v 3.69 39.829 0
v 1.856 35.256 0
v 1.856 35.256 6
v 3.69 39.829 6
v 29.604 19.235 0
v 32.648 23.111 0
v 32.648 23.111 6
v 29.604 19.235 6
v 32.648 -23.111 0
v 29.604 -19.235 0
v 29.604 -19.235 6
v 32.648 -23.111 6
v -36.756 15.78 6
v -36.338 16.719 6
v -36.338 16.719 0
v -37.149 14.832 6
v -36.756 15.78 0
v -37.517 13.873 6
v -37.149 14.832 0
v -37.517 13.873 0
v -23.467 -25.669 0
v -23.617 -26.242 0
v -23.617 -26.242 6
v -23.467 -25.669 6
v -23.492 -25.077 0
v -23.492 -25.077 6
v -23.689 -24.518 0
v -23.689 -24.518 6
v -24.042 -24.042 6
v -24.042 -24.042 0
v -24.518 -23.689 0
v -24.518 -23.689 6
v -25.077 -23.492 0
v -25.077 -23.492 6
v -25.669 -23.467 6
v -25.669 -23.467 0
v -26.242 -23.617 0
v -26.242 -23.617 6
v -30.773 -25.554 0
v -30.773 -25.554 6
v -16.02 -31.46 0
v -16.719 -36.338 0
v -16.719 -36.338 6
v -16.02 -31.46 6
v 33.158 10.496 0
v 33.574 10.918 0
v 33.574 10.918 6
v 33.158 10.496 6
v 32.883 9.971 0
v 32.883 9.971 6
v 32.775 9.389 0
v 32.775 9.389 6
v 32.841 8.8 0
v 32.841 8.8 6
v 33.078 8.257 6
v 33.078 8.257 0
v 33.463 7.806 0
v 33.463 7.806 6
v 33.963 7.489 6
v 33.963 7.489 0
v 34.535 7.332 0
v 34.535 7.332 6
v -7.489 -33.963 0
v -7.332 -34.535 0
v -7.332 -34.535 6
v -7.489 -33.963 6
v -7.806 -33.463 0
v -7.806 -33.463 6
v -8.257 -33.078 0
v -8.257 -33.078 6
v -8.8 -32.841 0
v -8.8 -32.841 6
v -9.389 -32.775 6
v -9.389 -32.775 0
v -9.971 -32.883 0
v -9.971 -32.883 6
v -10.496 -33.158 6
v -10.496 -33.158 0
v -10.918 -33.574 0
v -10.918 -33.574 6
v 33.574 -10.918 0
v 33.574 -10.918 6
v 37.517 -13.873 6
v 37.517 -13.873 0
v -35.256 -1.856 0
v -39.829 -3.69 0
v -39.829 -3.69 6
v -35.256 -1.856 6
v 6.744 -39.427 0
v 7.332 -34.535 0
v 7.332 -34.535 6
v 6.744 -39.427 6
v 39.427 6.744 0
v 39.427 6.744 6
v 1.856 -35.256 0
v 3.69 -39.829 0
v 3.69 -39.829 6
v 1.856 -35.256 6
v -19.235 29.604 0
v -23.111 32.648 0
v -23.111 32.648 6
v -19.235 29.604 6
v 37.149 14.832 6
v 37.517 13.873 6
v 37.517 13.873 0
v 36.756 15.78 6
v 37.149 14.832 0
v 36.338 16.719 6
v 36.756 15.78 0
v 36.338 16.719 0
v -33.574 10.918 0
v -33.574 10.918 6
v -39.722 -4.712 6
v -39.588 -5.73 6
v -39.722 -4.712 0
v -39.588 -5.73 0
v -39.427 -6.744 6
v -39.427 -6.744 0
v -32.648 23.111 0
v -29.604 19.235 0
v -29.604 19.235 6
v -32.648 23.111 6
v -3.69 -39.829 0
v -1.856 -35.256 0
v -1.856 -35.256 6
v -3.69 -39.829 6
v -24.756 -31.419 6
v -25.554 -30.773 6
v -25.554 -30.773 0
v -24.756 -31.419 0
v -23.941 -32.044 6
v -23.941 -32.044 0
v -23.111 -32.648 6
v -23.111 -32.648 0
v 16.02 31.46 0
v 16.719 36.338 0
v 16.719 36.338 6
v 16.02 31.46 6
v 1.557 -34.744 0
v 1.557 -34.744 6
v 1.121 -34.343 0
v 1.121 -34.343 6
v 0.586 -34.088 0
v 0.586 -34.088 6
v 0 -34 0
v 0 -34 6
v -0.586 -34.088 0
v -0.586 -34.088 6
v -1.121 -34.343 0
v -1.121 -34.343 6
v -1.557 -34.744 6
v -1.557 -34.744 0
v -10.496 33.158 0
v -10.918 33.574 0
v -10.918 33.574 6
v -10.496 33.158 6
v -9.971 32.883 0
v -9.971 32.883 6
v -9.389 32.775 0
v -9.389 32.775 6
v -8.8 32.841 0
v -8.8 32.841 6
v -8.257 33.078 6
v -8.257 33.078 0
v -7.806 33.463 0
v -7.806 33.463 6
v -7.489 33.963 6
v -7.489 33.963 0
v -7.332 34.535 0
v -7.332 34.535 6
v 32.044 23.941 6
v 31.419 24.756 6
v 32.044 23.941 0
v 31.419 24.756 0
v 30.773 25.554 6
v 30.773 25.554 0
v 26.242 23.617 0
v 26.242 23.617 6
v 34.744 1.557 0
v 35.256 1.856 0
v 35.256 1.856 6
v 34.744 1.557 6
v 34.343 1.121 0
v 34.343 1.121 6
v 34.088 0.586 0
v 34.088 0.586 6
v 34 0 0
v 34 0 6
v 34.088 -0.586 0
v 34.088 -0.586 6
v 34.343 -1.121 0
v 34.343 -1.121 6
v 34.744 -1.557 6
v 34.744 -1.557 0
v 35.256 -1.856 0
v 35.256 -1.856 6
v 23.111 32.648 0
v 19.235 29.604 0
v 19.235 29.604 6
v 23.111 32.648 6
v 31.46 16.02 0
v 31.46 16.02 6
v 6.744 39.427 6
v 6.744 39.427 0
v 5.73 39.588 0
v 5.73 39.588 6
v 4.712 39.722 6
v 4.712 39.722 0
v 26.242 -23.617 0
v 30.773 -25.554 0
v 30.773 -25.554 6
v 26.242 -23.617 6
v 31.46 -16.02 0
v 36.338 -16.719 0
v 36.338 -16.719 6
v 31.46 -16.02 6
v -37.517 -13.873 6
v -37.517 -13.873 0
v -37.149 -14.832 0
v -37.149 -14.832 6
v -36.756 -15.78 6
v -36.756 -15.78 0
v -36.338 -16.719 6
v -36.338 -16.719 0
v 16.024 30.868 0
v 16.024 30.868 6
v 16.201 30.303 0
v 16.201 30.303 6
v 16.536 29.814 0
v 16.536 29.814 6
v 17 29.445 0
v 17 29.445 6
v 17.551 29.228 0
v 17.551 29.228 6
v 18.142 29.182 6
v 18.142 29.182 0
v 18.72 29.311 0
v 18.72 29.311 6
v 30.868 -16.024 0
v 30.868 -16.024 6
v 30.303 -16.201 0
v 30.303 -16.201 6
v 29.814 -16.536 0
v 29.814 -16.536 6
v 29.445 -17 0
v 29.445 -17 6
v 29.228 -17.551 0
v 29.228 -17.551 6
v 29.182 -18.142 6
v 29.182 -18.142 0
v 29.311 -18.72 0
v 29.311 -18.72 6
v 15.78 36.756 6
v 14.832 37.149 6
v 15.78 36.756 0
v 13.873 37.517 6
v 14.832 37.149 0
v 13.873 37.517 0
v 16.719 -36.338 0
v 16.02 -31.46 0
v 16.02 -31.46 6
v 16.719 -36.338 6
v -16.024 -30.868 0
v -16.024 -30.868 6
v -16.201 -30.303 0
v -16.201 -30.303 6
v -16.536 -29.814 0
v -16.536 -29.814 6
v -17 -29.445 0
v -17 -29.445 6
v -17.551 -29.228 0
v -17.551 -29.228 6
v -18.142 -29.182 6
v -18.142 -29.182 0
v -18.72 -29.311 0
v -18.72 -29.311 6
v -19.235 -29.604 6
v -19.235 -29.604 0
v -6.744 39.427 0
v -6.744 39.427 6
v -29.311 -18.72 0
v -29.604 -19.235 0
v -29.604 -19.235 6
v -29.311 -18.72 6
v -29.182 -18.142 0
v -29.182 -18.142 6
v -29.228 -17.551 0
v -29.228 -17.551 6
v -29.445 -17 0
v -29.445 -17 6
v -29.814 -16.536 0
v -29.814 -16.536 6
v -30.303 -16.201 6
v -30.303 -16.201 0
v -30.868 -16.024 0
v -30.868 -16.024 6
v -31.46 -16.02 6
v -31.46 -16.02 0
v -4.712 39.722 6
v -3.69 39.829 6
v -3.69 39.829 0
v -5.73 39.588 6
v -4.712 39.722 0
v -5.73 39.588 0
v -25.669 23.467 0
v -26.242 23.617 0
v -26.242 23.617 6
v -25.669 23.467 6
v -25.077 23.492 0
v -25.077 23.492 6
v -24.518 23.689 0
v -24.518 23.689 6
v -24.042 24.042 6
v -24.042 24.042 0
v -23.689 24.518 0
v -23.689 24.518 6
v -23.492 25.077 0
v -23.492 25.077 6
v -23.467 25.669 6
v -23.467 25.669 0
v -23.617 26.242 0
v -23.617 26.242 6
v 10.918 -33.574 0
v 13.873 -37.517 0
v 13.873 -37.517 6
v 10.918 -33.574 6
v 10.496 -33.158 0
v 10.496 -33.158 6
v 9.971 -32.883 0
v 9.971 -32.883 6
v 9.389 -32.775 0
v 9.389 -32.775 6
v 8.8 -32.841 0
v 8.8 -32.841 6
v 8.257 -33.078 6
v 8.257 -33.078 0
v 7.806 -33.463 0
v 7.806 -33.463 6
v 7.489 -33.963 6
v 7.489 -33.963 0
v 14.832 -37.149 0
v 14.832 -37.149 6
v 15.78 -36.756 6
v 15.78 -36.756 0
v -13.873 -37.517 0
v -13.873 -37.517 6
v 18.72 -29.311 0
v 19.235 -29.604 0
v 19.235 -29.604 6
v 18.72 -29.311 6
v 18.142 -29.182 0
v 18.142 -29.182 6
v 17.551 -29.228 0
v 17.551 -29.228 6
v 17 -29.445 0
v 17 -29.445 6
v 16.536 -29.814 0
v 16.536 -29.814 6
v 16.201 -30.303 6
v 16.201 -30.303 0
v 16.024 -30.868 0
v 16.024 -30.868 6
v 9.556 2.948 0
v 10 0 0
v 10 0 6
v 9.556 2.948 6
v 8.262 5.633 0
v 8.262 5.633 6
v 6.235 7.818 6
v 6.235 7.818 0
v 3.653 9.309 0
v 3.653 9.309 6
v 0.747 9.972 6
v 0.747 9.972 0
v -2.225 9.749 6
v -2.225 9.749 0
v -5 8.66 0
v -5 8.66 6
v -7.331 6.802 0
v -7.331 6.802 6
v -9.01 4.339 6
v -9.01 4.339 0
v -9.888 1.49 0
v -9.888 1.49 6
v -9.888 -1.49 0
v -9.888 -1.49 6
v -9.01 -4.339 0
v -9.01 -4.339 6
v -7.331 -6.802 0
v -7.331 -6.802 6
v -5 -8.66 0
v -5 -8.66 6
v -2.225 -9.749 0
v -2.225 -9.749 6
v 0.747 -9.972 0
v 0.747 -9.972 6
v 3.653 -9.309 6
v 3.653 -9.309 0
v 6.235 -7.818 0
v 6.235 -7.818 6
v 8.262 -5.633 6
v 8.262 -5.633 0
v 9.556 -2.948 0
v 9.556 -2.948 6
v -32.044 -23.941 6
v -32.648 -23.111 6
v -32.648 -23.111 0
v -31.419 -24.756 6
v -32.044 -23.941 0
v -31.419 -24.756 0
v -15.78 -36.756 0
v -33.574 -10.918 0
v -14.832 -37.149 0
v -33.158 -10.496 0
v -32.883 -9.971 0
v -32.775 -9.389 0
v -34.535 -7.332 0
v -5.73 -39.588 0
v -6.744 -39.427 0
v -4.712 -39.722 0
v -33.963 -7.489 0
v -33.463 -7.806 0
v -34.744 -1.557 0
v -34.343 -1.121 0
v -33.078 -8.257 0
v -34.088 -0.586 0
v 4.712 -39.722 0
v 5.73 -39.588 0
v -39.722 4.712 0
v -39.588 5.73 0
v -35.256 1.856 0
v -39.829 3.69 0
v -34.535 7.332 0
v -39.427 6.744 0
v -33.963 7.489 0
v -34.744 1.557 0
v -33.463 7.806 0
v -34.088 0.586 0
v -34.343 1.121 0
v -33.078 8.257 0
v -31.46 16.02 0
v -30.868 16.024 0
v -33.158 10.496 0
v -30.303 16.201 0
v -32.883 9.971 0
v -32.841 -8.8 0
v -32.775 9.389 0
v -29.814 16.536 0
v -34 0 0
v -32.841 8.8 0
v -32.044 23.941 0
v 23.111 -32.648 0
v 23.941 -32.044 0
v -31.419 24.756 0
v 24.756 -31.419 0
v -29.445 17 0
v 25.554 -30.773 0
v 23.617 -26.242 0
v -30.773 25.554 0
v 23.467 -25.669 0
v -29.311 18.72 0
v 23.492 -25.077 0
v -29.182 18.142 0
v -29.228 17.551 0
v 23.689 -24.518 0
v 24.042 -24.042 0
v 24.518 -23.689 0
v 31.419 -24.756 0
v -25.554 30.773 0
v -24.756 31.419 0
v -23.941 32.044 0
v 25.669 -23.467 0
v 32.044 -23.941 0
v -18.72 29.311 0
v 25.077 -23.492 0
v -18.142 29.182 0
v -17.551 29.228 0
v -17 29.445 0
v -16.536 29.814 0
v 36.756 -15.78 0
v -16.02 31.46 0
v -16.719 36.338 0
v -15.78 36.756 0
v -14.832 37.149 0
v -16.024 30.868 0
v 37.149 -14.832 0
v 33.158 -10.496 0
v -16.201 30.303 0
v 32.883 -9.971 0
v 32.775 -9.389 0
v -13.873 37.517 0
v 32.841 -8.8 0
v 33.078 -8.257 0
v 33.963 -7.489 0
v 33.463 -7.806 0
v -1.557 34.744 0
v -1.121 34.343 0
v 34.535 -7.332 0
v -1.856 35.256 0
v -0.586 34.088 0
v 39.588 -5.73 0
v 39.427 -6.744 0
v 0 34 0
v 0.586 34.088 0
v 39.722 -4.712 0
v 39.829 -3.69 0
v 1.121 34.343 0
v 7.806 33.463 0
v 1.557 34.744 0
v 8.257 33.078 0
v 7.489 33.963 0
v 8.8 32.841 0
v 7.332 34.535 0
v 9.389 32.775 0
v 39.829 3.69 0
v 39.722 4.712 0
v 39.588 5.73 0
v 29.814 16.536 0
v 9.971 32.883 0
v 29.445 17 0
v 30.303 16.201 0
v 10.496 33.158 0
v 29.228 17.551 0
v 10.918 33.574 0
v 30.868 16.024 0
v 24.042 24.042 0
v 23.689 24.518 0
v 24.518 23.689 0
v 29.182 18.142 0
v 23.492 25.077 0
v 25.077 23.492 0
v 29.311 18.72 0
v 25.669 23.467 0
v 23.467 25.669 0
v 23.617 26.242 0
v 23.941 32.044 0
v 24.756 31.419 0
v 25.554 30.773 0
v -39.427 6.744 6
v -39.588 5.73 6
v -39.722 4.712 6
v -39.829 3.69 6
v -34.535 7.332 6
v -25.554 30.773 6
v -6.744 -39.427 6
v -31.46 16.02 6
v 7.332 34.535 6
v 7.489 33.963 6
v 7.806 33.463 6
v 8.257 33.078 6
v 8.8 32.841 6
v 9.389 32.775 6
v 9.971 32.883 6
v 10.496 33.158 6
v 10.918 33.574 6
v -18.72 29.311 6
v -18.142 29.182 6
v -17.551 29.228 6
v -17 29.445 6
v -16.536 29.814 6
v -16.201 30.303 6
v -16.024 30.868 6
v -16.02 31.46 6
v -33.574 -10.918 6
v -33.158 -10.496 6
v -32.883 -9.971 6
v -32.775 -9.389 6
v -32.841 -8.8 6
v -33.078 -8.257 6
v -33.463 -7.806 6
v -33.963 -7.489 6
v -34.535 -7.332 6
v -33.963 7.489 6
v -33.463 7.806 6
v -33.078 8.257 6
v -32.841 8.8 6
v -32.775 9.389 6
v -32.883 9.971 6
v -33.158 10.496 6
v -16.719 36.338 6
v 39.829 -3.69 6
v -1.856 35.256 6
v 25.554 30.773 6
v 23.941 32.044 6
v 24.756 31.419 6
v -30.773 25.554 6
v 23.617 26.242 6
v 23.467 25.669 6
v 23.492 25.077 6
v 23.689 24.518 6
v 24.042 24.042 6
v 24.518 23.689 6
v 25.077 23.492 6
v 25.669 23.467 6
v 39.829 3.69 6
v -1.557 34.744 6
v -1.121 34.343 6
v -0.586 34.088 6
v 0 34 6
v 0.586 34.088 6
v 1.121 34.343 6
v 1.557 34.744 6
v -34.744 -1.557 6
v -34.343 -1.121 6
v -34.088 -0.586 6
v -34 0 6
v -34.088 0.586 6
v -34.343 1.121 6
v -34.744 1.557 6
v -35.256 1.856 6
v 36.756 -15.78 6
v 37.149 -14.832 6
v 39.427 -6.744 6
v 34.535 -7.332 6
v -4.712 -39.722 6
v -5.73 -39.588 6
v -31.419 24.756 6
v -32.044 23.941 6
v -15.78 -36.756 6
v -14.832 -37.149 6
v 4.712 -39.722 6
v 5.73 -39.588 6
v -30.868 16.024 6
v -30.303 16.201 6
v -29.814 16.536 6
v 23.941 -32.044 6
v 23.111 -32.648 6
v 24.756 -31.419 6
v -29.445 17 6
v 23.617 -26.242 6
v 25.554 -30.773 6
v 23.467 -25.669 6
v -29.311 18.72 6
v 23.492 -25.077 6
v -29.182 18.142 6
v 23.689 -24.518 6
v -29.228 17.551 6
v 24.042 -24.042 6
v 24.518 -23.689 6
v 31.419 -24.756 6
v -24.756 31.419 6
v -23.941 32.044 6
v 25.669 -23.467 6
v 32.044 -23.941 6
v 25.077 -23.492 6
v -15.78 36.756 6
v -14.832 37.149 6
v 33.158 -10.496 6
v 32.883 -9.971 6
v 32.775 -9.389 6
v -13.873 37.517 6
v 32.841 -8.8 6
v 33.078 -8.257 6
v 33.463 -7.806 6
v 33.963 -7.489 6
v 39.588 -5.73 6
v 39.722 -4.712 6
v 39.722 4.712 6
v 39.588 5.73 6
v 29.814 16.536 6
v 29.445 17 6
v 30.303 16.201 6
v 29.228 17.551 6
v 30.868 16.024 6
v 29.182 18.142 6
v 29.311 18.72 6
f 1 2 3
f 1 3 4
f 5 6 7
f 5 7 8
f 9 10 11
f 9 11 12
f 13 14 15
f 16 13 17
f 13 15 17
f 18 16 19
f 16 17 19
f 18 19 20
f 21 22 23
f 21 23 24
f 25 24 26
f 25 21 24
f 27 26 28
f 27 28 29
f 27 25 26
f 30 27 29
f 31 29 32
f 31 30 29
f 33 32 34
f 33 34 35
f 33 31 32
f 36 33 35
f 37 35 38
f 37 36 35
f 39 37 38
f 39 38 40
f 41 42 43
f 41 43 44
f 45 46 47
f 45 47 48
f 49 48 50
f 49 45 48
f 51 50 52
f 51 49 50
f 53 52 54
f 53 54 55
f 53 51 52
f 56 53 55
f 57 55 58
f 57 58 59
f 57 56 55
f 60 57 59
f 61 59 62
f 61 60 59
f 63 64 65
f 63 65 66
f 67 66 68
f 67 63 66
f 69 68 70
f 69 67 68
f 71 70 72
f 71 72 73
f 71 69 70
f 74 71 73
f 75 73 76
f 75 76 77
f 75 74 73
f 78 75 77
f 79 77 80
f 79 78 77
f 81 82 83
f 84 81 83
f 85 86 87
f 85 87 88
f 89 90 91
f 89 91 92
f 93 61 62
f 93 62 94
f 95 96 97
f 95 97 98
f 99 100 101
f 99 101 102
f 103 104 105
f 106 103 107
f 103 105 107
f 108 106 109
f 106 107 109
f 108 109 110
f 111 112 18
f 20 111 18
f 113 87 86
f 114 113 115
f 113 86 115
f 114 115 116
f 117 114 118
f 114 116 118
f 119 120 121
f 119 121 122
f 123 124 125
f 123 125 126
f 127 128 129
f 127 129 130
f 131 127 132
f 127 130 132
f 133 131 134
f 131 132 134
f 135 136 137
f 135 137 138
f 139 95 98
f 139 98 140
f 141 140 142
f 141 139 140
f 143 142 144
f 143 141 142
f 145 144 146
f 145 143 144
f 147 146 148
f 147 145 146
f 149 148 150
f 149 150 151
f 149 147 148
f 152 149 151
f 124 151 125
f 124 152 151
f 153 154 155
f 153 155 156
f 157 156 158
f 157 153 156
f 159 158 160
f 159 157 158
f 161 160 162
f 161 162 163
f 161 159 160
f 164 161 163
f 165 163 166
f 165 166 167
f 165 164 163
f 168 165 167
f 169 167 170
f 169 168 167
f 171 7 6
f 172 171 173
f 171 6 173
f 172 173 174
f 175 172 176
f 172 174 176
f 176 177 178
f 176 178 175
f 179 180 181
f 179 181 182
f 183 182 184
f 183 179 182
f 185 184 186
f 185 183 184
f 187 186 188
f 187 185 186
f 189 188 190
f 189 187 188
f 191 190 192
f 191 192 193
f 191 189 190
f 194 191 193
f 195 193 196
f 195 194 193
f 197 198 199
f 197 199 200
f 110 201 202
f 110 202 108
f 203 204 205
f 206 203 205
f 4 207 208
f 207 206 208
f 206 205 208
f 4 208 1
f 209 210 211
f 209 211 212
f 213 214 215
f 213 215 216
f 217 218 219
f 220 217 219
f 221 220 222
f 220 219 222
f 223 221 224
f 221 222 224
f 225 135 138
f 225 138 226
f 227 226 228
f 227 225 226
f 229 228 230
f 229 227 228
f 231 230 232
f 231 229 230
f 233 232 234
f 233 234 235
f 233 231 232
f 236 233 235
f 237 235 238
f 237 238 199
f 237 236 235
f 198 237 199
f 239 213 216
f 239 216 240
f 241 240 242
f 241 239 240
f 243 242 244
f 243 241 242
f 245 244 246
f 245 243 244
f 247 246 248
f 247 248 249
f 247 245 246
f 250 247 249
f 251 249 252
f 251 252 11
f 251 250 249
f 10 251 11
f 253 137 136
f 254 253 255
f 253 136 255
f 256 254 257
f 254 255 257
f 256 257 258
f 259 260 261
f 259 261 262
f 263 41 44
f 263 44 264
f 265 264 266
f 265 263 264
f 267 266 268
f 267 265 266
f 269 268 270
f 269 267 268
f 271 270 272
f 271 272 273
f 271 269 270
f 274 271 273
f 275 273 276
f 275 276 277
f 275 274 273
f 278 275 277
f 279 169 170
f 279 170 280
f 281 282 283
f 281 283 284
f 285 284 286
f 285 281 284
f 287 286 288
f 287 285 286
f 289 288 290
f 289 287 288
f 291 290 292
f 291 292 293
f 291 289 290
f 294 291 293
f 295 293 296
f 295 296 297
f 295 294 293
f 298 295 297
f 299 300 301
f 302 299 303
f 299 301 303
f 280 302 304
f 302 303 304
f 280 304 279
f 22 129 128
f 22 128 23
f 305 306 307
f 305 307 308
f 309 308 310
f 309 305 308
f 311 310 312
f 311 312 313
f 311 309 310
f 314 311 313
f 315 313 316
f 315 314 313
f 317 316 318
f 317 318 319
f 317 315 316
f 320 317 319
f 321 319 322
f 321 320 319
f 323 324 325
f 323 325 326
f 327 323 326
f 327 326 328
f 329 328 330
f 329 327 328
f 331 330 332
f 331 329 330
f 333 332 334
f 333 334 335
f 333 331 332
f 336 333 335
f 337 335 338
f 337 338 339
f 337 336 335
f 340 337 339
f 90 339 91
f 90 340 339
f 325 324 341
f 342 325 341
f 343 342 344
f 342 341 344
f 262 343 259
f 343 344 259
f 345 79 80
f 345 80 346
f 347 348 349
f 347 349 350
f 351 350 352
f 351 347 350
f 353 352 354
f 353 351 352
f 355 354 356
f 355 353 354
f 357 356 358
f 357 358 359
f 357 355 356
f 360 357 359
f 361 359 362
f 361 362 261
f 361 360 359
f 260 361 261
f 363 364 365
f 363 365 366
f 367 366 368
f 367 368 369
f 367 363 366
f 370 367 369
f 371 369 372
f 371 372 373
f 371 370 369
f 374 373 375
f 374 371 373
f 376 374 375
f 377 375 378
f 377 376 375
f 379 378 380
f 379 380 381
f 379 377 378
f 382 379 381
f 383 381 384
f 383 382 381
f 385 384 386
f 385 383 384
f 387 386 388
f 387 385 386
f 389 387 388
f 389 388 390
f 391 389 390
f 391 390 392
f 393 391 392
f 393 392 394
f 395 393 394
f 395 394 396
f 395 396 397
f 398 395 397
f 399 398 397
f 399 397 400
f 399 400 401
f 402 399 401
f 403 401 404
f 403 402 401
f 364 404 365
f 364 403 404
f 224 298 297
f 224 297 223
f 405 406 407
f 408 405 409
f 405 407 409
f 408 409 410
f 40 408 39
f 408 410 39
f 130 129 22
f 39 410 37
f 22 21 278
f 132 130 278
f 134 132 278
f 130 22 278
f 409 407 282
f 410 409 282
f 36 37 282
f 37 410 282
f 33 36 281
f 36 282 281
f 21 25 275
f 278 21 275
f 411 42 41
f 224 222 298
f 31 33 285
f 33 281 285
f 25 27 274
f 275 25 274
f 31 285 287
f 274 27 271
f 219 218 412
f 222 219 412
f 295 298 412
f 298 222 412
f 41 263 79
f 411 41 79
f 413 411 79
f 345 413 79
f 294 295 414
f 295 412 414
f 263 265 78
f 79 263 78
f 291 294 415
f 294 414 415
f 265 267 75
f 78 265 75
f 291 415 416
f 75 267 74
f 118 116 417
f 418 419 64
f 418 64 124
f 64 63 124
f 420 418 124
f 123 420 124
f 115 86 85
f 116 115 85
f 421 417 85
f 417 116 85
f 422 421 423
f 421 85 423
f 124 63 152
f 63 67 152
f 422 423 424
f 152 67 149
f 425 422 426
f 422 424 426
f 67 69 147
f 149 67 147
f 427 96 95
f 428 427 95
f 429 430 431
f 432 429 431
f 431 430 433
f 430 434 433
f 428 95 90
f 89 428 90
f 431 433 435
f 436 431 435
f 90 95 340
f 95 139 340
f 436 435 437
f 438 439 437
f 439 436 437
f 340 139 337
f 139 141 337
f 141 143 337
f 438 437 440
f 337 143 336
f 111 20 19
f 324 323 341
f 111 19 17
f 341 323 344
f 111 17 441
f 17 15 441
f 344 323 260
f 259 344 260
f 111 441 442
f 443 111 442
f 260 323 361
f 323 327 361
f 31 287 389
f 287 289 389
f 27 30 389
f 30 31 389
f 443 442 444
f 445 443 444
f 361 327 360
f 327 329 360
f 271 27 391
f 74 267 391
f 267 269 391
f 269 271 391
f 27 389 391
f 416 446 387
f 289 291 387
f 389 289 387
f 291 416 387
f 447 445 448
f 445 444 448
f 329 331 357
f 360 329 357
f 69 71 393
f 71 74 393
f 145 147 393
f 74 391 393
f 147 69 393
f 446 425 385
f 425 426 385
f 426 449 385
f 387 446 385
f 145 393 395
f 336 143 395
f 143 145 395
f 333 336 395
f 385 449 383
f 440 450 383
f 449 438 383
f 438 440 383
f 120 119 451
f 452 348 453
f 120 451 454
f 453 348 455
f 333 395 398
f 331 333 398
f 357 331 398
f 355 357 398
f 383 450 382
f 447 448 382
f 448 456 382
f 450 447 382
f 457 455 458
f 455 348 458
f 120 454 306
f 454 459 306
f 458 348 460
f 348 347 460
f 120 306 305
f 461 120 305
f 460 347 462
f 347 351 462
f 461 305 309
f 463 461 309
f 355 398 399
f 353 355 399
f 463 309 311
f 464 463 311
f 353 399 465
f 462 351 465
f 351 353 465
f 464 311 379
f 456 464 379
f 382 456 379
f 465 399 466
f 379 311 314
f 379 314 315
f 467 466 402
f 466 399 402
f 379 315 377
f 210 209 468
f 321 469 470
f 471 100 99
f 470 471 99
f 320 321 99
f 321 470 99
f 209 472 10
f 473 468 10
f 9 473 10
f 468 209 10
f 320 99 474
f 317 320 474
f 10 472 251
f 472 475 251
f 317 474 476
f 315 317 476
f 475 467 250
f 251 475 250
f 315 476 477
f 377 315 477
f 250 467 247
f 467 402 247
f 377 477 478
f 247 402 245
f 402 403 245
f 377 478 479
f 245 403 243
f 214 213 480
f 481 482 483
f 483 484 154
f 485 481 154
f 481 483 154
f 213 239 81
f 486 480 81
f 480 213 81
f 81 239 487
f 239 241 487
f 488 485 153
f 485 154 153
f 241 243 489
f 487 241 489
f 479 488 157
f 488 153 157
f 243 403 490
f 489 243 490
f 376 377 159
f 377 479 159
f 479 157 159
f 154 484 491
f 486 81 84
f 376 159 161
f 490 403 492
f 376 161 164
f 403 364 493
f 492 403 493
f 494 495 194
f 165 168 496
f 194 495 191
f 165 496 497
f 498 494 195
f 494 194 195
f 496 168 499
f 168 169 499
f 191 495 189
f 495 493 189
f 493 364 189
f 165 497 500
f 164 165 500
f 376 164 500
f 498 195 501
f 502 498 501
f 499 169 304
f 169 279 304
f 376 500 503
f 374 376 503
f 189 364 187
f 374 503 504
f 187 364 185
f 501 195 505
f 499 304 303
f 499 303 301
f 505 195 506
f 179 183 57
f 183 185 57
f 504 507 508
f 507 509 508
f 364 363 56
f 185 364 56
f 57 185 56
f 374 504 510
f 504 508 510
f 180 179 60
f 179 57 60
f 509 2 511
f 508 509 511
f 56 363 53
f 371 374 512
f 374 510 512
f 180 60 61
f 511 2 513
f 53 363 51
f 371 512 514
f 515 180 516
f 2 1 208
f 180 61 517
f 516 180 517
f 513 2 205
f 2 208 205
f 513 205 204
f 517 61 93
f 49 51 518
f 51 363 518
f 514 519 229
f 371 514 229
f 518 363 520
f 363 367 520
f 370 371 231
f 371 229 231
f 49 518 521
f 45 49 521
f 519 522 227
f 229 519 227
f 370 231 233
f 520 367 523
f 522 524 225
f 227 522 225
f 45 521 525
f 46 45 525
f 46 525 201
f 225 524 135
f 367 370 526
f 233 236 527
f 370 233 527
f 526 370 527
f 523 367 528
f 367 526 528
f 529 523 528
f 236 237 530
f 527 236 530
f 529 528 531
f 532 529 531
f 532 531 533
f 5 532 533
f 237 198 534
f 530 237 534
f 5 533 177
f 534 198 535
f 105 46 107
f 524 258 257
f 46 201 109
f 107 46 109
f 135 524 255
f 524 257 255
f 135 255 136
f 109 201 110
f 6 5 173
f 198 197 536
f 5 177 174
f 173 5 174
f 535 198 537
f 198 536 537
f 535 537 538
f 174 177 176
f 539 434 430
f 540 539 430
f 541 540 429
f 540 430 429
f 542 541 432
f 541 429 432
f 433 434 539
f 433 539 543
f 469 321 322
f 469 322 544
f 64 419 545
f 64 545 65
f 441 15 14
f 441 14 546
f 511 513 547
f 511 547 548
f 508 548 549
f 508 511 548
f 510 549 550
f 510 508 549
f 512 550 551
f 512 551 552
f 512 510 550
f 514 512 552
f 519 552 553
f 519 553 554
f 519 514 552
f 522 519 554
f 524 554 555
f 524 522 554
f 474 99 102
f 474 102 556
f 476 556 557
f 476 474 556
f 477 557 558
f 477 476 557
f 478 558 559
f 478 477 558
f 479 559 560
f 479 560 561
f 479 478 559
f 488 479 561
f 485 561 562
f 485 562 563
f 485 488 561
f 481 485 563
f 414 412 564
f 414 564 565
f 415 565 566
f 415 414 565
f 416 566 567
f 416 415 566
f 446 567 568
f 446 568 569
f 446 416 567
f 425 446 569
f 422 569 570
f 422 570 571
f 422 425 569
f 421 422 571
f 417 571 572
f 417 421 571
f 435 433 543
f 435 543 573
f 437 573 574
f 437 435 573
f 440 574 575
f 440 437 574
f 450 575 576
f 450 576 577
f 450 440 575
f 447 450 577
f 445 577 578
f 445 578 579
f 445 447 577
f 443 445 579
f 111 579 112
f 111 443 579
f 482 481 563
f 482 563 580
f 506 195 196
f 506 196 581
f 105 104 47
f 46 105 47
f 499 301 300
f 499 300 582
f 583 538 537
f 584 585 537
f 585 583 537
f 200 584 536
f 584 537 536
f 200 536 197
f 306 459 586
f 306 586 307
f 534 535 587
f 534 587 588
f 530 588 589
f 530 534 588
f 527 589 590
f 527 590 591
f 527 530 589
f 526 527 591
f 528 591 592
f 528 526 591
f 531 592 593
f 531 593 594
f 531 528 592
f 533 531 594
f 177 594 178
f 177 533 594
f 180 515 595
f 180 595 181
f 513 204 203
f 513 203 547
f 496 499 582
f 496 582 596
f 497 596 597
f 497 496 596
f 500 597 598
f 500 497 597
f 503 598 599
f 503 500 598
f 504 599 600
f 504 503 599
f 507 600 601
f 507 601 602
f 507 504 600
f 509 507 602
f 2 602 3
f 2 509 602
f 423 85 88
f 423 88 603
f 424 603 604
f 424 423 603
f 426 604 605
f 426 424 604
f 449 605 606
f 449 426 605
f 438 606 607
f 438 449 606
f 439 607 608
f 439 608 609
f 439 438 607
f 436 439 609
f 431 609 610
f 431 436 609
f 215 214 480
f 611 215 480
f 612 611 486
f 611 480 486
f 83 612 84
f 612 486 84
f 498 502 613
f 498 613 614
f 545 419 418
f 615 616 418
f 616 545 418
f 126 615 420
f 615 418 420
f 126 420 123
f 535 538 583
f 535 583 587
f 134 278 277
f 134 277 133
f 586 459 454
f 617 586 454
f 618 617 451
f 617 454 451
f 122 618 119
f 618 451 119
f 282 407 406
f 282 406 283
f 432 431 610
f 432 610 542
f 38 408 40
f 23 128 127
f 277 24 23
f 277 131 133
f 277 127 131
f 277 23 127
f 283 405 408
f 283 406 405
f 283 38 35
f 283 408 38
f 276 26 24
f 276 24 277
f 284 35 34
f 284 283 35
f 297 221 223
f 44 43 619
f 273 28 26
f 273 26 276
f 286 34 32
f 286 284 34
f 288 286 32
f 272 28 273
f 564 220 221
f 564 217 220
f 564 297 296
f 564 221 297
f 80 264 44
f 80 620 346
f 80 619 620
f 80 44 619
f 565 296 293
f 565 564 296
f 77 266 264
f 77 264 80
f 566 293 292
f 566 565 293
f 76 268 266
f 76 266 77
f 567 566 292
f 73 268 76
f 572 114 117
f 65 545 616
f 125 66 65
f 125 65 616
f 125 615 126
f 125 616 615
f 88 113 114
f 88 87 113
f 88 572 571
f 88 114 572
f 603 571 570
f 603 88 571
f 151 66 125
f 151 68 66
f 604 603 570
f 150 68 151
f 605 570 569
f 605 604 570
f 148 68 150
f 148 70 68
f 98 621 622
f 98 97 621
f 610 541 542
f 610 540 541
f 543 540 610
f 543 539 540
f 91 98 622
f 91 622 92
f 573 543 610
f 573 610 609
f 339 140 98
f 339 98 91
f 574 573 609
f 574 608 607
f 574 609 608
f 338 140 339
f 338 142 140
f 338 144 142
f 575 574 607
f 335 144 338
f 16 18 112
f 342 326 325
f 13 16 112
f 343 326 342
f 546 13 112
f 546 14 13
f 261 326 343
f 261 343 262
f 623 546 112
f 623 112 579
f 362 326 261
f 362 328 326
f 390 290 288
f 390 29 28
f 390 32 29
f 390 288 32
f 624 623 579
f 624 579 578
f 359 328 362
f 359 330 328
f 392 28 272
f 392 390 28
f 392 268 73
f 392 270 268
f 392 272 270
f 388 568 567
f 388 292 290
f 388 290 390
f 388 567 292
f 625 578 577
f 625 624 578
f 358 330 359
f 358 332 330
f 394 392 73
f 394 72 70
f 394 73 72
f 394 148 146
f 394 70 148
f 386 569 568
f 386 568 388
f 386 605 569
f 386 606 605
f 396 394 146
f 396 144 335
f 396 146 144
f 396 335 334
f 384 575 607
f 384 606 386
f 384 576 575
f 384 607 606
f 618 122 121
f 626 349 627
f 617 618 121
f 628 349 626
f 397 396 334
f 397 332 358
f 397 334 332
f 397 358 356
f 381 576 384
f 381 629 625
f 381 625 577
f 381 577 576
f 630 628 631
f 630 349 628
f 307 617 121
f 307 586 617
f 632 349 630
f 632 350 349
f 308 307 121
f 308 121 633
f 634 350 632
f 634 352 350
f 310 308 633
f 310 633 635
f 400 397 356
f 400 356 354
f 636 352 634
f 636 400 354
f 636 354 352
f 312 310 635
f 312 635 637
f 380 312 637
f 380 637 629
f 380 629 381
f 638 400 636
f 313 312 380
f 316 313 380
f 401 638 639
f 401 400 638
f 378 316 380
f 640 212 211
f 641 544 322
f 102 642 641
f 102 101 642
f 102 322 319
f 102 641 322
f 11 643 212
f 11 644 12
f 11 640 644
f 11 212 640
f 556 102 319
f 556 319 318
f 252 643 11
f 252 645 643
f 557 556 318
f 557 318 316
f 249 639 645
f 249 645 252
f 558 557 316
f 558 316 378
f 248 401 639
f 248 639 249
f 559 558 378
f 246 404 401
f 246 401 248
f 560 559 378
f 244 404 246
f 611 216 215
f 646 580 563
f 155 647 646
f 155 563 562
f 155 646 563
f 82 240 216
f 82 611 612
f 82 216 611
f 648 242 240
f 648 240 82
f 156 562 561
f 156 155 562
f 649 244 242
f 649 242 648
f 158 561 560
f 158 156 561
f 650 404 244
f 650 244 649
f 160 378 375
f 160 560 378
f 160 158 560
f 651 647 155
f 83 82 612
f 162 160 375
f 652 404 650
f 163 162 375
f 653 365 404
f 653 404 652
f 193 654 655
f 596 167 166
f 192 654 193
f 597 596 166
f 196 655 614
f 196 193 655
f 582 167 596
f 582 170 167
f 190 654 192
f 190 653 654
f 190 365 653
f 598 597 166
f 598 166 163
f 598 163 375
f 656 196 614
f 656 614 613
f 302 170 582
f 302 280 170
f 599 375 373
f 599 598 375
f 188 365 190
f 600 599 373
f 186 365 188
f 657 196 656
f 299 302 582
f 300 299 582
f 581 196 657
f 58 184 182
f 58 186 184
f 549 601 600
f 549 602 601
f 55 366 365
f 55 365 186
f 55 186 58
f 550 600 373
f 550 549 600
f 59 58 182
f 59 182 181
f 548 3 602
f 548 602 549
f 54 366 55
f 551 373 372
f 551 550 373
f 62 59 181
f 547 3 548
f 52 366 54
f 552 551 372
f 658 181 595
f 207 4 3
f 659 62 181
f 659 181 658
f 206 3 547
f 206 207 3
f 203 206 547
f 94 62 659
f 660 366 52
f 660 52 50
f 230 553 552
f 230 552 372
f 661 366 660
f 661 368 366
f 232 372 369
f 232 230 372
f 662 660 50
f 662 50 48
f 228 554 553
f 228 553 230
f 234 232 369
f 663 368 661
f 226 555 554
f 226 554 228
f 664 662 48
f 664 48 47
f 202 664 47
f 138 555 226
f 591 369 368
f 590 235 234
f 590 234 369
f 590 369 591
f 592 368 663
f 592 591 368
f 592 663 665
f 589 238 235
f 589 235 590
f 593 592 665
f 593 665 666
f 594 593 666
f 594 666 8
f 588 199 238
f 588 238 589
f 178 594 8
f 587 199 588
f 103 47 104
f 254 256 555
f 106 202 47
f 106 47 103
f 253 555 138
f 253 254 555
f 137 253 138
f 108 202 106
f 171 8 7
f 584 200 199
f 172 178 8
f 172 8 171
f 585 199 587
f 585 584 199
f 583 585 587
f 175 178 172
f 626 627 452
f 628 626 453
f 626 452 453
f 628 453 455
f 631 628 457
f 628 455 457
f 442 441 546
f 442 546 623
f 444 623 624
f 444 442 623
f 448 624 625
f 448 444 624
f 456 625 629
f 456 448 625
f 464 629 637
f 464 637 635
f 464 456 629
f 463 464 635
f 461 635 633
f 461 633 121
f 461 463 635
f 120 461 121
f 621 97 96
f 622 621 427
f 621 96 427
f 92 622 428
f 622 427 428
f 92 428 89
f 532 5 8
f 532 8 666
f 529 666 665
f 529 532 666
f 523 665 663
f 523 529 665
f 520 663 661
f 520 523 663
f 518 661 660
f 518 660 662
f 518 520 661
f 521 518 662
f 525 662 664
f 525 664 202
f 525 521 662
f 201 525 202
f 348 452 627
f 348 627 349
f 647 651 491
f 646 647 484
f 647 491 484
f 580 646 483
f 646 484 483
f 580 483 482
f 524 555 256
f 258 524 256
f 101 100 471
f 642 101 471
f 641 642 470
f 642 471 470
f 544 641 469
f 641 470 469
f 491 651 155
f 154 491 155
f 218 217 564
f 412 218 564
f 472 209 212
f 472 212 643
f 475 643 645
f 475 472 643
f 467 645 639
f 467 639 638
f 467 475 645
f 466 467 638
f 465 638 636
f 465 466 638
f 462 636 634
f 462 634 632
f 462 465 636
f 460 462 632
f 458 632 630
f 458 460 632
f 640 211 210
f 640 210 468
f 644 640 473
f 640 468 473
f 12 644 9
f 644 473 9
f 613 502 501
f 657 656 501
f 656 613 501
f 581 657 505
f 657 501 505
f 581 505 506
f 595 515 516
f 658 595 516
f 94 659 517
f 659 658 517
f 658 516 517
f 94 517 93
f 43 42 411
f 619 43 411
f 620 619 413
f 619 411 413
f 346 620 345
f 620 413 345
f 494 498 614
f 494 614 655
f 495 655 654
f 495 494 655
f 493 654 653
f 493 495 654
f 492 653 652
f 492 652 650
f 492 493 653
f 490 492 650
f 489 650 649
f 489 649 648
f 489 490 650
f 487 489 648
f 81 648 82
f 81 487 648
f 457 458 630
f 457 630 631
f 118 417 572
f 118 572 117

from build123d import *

# Parameters (mm, degrees)
SKETCH1_R           = 40
SKETCH1_R_2         = 10
BOSS_EXTRUDE1_DEPTH = 6
CUT_EXTRUDE1_START  = -6
CUT_EXTRUDE1_DEPTH  = 6
CIRPATTERN1_DEPTH   = 6


# Read off the part's stored shape, not the designer's step: CirPattern1
with BuildPart() as part:
    # Sketch1 → Boss-Extrude1 (new body)
    with BuildSketch(Plane.XY):
        Circle(SKETCH1_R)
        Circle(SKETCH1_R_2, mode=Mode.SUBTRACT)
    extrude(amount=BOSS_EXTRUDE1_DEPTH)

    # Sketch2 → Cut-Extrude1 (cut)
    with BuildSketch(Plane.XY.offset(6).offset(CUT_EXTRUDE1_START)):
        with BuildLine():
            Line((-3.690328017, 39.829404705), (-1.856322788, 35.255644098))
            ThreePointArc((-1.856322788, 35.255644098), (0, 34), (1.856322788, 35.255644098))
            Line((1.856322788, 35.255644098), (3.690328017, 39.829404705))
            ThreePointArc((3.690328017, 39.829404705), (0, 40), (-3.690328017, 39.829404705))
        make_face()
    extrude(amount=CUT_EXTRUDE1_DEPTH, mode=Mode.SUBTRACT)

    # CirPattern1 outline → CirPattern1 (cut)
    with BuildSketch(Plane.XY):
        with BuildLine():
            ThreePointArc((-10.917902263, 33.573885466), (-8.799847534, 32.841478094), (-7.331762018, 34.534788848))
            Line((-7.331762018, 34.534788848), (-6.744025354, 39.427377824))
            ThreePointArc((-6.744025354, 39.427377824), (-10.352761804, 38.637033052), (-13.873191632, 37.517123477))
            Line((-13.873191632, 37.517123477), (-10.917902263, 33.573885466))
        make_face()
        with BuildLine():
            Line((10.917902263, 33.573885466), (13.873191632, 37.517123477))
            ThreePointArc((13.873191632, 37.517123477), (10.352761804, 38.637033052), (6.744025354, 39.427377824))
            Line((6.744025354, 39.427377824), (7.331762018, 34.534788848))
            ThreePointArc((7.331762018, 34.534788848), (8.799847534, 32.841478094), (10.917902263, 33.573885466))
        make_face()
        with BuildLine():
            Line((19.235444741, 29.604122022), (23.110620163, 32.648112284))
            ThreePointArc((23.110620163, 32.648112284), (20, 34.641016152), (16.718784541, 36.338440301))
            Line((16.718784541, 36.338440301), (16.020199358, 31.46044481))
            ThreePointArc((16.020199358, 31.46044481), (17, 29.444863729), (19.235444741, 29.604122022))
        make_face()
        with BuildLine():
            Line((26.242123448, 23.616886586), (30.773098123, 25.554186192))
            ThreePointArc((30.773098123, 25.554186192), (28.284271248, 28.284271248), (25.554186192, 30.773098123))
            Line((25.554186192, 30.773098123), (23.616886586, 26.242123448))
            ThreePointArc((23.616886586, 26.242123448), (24.04163056, 24.04163056), (26.242123448, 23.616886586))
        make_face()
        with BuildLine():
            Line((31.46044481, 16.020199358), (36.338440301, 16.718784541))
            ThreePointArc((36.338440301, 16.718784541), (34.641016152, 20), (32.648112284, 23.110620163))
            Line((32.648112284, 23.110620163), (29.604122022, 19.235444741))
            ThreePointArc((29.604122022, 19.235444741), (29.444863729, 17), (31.46044481, 16.020199358))
        make_face()
        with BuildLine():
            Line((34.534788848, 7.331762018), (39.427377824, 6.744025354))
            ThreePointArc((39.427377824, 6.744025354), (38.637033052, 10.352761804), (37.517123477, 13.873191632))
            Line((37.517123477, 13.873191632), (33.573885466, 10.917902263))
            ThreePointArc((33.573885466, 10.917902263), (32.841478094, 8.799847534), (34.534788848, 7.331762018))
        make_face()
        with BuildLine():
            Line((35.255644098, -1.856322788), (39.829404705, -3.690328017))
            ThreePointArc((39.829404705, -3.690328017), (40, 0), (39.829404705, 3.690328017))
            Line((39.829404705, 3.690328017), (35.255644098, 1.856322788))
            ThreePointArc((35.255644098, 1.856322788), (34, 0), (35.255644098, -1.856322788))
        make_face()
        with BuildLine():
            Line((33.573885466, -10.917902263), (37.517123477, -13.873191632))
            ThreePointArc((37.517123477, -13.873191632), (38.637033052, -10.352761804), (39.427377823, -6.744025354))
            Line((39.427377823, -6.744025354), (34.534788848, -7.331762018))
            ThreePointArc((34.534788848, -7.331762018), (32.841478094, -8.799847534), (33.573885466, -10.917902263))
        make_face()
        with BuildLine():
            Line((29.604122022, -19.235444741), (32.648112283, -23.110620163))
            ThreePointArc((32.648112283, -23.110620163), (34.641016152, -20), (36.3384403, -16.718784541))
            Line((36.3384403, -16.718784541), (31.46044481, -16.020199358))
            ThreePointArc((31.46044481, -16.020199358), (29.444863729, -17), (29.604122022, -19.235444741))
        make_face()
        with BuildLine():
            Line((23.616886586, -26.242123448), (25.554186192, -30.773098123))
            ThreePointArc((25.554186192, -30.773098123), (28.284271247, -28.284271247), (30.773098123, -25.554186192))
            Line((30.773098123, -25.554186192), (26.242123448, -23.616886586))
            ThreePointArc((26.242123448, -23.616886586), (24.04163056, -24.04163056), (23.616886586, -26.242123448))
        make_face()
        with BuildLine():
            Line((16.020199358, -31.46044481), (16.718784541, -36.3384403))
            ThreePointArc((16.718784541, -36.3384403), (20, -34.641016151), (23.110620163, -32.648112283))
            Line((23.110620163, -32.648112283), (19.235444741, -29.604122022))
            ThreePointArc((19.235444741, -29.604122022), (17, -29.444863729), (16.020199358, -31.46044481))
        make_face()
        with BuildLine():
            Line((7.331762018, -34.534788848), (6.744025354, -39.427377823))
            ThreePointArc((6.744025354, -39.427377823), (10.352761804, -38.637033051), (13.873191632, -37.517123476))
            Line((13.873191632, -37.517123476), (10.917902263, -33.573885466))
            ThreePointArc((10.917902263, -33.573885466), (8.799847534, -32.841478094), (7.331762018, -34.534788848))
        make_face()
        with BuildLine():
            Line((-1.856322788, -35.255644098), (-3.690328017, -39.829404705))
            ThreePointArc((-3.690328017, -39.829404705), (0, -40), (3.690328017, -39.829404705))
            Line((3.690328017, -39.829404705), (1.856322788, -35.255644098))
            ThreePointArc((1.856322788, -35.255644098), (0, -34), (-1.856322788, -35.255644098))
        make_face()
        with BuildLine():
            Line((-10.917902263, -33.573885466), (-13.873191632, -37.517123476))
            ThreePointArc((-13.873191632, -37.517123476), (-10.352761804, -38.637033051), (-6.744025354, -39.427377823))
            Line((-6.744025354, -39.427377823), (-7.331762018, -34.534788848))
            ThreePointArc((-7.331762018, -34.534788848), (-8.799847534, -32.841478094), (-10.917902263, -33.573885466))
        make_face()
        with BuildLine():
            Line((-19.235444741, -29.604122022), (-23.110620163, -32.648112283))
            ThreePointArc((-23.110620163, -32.648112283), (-20, -34.641016151), (-16.718784541, -36.3384403))
            Line((-16.718784541, -36.3384403), (-16.020199358, -31.46044481))
            ThreePointArc((-16.020199358, -31.46044481), (-17, -29.444863729), (-19.235444741, -29.604122022))
        make_face()
        with BuildLine():
            Line((-26.242123448, -23.616886586), (-30.773098123, -25.554186192))
            ThreePointArc((-30.773098123, -25.554186192), (-28.284271247, -28.284271247), (-25.554186192, -30.773098123))
            Line((-25.554186192, -30.773098123), (-23.616886586, -26.242123448))
            ThreePointArc((-23.616886586, -26.242123448), (-24.04163056, -24.04163056), (-26.242123448, -23.616886586))
        make_face()
        with BuildLine():
            Line((-31.46044481, -16.020199358), (-36.3384403, -16.718784541))
            ThreePointArc((-36.3384403, -16.718784541), (-34.641016152, -20), (-32.648112283, -23.110620163))
            Line((-32.648112283, -23.110620163), (-29.604122022, -19.235444741))
            ThreePointArc((-29.604122022, -19.235444741), (-29.444863729, -17), (-31.46044481, -16.020199358))
        make_face()
        with BuildLine():
            Line((-34.534788848, -7.331762018), (-39.427377823, -6.744025354))
            ThreePointArc((-39.427377823, -6.744025354), (-38.637033052, -10.352761804), (-37.517123477, -13.873191632))
            Line((-37.517123477, -13.873191632), (-33.573885466, -10.917902263))
            ThreePointArc((-33.573885466, -10.917902263), (-32.841478094, -8.799847534), (-34.534788848, -7.331762018))
        make_face()
        with BuildLine():
            Line((-35.255644098, 1.856322788), (-39.829404705, 3.690328017))
            ThreePointArc((-39.829404705, 3.690328017), (-40, 0), (-39.829404705, -3.690328017))
            Line((-39.829404705, -3.690328017), (-35.255644098, -1.856322788))
            ThreePointArc((-35.255644098, -1.856322788), (-34, 0), (-35.255644098, 1.856322788))
        make_face()
        with BuildLine():
            Line((-33.573885466, 10.917902263), (-37.517123477, 13.873191632))
            ThreePointArc((-37.517123477, 13.873191632), (-38.637033052, 10.352761804), (-39.427377824, 6.744025354))
            Line((-39.427377824, 6.744025354), (-34.534788848, 7.331762018))
            ThreePointArc((-34.534788848, 7.331762018), (-32.841478094, 8.799847534), (-33.573885466, 10.917902263))
        make_face()
        with BuildLine():
            Line((-29.604122022, 19.235444741), (-32.648112284, 23.110620163))
            ThreePointArc((-32.648112284, 23.110620163), (-34.641016152, 20), (-36.338440301, 16.718784541))
            Line((-36.338440301, 16.718784541), (-31.46044481, 16.020199358))
            ThreePointArc((-31.46044481, 16.020199358), (-29.444863729, 17), (-29.604122022, 19.235444741))
        make_face()
        with BuildLine():
            Line((-23.616886586, 26.242123448), (-25.554186192, 30.773098123))
            ThreePointArc((-25.554186192, 30.773098123), (-28.284271248, 28.284271248), (-30.773098123, 25.554186192))
            Line((-30.773098123, 25.554186192), (-26.242123448, 23.616886586))
            ThreePointArc((-26.242123448, 23.616886586), (-24.04163056, 24.04163056), (-23.616886586, 26.242123448))
        make_face()
        with BuildLine():
            Line((-16.020199358, 31.46044481), (-16.718784541, 36.338440301))
            ThreePointArc((-16.718784541, 36.338440301), (-20, 34.641016152), (-23.110620163, 32.648112284))
            Line((-23.110620163, 32.648112284), (-19.235444741, 29.604122022))
            ThreePointArc((-19.235444741, 29.604122022), (-17, 29.444863729), (-16.020199358, 31.46044481))
        make_face()
    extrude(amount=CIRPATTERN1_DEPTH, mode=Mode.SUBTRACT)


solid = part.part
